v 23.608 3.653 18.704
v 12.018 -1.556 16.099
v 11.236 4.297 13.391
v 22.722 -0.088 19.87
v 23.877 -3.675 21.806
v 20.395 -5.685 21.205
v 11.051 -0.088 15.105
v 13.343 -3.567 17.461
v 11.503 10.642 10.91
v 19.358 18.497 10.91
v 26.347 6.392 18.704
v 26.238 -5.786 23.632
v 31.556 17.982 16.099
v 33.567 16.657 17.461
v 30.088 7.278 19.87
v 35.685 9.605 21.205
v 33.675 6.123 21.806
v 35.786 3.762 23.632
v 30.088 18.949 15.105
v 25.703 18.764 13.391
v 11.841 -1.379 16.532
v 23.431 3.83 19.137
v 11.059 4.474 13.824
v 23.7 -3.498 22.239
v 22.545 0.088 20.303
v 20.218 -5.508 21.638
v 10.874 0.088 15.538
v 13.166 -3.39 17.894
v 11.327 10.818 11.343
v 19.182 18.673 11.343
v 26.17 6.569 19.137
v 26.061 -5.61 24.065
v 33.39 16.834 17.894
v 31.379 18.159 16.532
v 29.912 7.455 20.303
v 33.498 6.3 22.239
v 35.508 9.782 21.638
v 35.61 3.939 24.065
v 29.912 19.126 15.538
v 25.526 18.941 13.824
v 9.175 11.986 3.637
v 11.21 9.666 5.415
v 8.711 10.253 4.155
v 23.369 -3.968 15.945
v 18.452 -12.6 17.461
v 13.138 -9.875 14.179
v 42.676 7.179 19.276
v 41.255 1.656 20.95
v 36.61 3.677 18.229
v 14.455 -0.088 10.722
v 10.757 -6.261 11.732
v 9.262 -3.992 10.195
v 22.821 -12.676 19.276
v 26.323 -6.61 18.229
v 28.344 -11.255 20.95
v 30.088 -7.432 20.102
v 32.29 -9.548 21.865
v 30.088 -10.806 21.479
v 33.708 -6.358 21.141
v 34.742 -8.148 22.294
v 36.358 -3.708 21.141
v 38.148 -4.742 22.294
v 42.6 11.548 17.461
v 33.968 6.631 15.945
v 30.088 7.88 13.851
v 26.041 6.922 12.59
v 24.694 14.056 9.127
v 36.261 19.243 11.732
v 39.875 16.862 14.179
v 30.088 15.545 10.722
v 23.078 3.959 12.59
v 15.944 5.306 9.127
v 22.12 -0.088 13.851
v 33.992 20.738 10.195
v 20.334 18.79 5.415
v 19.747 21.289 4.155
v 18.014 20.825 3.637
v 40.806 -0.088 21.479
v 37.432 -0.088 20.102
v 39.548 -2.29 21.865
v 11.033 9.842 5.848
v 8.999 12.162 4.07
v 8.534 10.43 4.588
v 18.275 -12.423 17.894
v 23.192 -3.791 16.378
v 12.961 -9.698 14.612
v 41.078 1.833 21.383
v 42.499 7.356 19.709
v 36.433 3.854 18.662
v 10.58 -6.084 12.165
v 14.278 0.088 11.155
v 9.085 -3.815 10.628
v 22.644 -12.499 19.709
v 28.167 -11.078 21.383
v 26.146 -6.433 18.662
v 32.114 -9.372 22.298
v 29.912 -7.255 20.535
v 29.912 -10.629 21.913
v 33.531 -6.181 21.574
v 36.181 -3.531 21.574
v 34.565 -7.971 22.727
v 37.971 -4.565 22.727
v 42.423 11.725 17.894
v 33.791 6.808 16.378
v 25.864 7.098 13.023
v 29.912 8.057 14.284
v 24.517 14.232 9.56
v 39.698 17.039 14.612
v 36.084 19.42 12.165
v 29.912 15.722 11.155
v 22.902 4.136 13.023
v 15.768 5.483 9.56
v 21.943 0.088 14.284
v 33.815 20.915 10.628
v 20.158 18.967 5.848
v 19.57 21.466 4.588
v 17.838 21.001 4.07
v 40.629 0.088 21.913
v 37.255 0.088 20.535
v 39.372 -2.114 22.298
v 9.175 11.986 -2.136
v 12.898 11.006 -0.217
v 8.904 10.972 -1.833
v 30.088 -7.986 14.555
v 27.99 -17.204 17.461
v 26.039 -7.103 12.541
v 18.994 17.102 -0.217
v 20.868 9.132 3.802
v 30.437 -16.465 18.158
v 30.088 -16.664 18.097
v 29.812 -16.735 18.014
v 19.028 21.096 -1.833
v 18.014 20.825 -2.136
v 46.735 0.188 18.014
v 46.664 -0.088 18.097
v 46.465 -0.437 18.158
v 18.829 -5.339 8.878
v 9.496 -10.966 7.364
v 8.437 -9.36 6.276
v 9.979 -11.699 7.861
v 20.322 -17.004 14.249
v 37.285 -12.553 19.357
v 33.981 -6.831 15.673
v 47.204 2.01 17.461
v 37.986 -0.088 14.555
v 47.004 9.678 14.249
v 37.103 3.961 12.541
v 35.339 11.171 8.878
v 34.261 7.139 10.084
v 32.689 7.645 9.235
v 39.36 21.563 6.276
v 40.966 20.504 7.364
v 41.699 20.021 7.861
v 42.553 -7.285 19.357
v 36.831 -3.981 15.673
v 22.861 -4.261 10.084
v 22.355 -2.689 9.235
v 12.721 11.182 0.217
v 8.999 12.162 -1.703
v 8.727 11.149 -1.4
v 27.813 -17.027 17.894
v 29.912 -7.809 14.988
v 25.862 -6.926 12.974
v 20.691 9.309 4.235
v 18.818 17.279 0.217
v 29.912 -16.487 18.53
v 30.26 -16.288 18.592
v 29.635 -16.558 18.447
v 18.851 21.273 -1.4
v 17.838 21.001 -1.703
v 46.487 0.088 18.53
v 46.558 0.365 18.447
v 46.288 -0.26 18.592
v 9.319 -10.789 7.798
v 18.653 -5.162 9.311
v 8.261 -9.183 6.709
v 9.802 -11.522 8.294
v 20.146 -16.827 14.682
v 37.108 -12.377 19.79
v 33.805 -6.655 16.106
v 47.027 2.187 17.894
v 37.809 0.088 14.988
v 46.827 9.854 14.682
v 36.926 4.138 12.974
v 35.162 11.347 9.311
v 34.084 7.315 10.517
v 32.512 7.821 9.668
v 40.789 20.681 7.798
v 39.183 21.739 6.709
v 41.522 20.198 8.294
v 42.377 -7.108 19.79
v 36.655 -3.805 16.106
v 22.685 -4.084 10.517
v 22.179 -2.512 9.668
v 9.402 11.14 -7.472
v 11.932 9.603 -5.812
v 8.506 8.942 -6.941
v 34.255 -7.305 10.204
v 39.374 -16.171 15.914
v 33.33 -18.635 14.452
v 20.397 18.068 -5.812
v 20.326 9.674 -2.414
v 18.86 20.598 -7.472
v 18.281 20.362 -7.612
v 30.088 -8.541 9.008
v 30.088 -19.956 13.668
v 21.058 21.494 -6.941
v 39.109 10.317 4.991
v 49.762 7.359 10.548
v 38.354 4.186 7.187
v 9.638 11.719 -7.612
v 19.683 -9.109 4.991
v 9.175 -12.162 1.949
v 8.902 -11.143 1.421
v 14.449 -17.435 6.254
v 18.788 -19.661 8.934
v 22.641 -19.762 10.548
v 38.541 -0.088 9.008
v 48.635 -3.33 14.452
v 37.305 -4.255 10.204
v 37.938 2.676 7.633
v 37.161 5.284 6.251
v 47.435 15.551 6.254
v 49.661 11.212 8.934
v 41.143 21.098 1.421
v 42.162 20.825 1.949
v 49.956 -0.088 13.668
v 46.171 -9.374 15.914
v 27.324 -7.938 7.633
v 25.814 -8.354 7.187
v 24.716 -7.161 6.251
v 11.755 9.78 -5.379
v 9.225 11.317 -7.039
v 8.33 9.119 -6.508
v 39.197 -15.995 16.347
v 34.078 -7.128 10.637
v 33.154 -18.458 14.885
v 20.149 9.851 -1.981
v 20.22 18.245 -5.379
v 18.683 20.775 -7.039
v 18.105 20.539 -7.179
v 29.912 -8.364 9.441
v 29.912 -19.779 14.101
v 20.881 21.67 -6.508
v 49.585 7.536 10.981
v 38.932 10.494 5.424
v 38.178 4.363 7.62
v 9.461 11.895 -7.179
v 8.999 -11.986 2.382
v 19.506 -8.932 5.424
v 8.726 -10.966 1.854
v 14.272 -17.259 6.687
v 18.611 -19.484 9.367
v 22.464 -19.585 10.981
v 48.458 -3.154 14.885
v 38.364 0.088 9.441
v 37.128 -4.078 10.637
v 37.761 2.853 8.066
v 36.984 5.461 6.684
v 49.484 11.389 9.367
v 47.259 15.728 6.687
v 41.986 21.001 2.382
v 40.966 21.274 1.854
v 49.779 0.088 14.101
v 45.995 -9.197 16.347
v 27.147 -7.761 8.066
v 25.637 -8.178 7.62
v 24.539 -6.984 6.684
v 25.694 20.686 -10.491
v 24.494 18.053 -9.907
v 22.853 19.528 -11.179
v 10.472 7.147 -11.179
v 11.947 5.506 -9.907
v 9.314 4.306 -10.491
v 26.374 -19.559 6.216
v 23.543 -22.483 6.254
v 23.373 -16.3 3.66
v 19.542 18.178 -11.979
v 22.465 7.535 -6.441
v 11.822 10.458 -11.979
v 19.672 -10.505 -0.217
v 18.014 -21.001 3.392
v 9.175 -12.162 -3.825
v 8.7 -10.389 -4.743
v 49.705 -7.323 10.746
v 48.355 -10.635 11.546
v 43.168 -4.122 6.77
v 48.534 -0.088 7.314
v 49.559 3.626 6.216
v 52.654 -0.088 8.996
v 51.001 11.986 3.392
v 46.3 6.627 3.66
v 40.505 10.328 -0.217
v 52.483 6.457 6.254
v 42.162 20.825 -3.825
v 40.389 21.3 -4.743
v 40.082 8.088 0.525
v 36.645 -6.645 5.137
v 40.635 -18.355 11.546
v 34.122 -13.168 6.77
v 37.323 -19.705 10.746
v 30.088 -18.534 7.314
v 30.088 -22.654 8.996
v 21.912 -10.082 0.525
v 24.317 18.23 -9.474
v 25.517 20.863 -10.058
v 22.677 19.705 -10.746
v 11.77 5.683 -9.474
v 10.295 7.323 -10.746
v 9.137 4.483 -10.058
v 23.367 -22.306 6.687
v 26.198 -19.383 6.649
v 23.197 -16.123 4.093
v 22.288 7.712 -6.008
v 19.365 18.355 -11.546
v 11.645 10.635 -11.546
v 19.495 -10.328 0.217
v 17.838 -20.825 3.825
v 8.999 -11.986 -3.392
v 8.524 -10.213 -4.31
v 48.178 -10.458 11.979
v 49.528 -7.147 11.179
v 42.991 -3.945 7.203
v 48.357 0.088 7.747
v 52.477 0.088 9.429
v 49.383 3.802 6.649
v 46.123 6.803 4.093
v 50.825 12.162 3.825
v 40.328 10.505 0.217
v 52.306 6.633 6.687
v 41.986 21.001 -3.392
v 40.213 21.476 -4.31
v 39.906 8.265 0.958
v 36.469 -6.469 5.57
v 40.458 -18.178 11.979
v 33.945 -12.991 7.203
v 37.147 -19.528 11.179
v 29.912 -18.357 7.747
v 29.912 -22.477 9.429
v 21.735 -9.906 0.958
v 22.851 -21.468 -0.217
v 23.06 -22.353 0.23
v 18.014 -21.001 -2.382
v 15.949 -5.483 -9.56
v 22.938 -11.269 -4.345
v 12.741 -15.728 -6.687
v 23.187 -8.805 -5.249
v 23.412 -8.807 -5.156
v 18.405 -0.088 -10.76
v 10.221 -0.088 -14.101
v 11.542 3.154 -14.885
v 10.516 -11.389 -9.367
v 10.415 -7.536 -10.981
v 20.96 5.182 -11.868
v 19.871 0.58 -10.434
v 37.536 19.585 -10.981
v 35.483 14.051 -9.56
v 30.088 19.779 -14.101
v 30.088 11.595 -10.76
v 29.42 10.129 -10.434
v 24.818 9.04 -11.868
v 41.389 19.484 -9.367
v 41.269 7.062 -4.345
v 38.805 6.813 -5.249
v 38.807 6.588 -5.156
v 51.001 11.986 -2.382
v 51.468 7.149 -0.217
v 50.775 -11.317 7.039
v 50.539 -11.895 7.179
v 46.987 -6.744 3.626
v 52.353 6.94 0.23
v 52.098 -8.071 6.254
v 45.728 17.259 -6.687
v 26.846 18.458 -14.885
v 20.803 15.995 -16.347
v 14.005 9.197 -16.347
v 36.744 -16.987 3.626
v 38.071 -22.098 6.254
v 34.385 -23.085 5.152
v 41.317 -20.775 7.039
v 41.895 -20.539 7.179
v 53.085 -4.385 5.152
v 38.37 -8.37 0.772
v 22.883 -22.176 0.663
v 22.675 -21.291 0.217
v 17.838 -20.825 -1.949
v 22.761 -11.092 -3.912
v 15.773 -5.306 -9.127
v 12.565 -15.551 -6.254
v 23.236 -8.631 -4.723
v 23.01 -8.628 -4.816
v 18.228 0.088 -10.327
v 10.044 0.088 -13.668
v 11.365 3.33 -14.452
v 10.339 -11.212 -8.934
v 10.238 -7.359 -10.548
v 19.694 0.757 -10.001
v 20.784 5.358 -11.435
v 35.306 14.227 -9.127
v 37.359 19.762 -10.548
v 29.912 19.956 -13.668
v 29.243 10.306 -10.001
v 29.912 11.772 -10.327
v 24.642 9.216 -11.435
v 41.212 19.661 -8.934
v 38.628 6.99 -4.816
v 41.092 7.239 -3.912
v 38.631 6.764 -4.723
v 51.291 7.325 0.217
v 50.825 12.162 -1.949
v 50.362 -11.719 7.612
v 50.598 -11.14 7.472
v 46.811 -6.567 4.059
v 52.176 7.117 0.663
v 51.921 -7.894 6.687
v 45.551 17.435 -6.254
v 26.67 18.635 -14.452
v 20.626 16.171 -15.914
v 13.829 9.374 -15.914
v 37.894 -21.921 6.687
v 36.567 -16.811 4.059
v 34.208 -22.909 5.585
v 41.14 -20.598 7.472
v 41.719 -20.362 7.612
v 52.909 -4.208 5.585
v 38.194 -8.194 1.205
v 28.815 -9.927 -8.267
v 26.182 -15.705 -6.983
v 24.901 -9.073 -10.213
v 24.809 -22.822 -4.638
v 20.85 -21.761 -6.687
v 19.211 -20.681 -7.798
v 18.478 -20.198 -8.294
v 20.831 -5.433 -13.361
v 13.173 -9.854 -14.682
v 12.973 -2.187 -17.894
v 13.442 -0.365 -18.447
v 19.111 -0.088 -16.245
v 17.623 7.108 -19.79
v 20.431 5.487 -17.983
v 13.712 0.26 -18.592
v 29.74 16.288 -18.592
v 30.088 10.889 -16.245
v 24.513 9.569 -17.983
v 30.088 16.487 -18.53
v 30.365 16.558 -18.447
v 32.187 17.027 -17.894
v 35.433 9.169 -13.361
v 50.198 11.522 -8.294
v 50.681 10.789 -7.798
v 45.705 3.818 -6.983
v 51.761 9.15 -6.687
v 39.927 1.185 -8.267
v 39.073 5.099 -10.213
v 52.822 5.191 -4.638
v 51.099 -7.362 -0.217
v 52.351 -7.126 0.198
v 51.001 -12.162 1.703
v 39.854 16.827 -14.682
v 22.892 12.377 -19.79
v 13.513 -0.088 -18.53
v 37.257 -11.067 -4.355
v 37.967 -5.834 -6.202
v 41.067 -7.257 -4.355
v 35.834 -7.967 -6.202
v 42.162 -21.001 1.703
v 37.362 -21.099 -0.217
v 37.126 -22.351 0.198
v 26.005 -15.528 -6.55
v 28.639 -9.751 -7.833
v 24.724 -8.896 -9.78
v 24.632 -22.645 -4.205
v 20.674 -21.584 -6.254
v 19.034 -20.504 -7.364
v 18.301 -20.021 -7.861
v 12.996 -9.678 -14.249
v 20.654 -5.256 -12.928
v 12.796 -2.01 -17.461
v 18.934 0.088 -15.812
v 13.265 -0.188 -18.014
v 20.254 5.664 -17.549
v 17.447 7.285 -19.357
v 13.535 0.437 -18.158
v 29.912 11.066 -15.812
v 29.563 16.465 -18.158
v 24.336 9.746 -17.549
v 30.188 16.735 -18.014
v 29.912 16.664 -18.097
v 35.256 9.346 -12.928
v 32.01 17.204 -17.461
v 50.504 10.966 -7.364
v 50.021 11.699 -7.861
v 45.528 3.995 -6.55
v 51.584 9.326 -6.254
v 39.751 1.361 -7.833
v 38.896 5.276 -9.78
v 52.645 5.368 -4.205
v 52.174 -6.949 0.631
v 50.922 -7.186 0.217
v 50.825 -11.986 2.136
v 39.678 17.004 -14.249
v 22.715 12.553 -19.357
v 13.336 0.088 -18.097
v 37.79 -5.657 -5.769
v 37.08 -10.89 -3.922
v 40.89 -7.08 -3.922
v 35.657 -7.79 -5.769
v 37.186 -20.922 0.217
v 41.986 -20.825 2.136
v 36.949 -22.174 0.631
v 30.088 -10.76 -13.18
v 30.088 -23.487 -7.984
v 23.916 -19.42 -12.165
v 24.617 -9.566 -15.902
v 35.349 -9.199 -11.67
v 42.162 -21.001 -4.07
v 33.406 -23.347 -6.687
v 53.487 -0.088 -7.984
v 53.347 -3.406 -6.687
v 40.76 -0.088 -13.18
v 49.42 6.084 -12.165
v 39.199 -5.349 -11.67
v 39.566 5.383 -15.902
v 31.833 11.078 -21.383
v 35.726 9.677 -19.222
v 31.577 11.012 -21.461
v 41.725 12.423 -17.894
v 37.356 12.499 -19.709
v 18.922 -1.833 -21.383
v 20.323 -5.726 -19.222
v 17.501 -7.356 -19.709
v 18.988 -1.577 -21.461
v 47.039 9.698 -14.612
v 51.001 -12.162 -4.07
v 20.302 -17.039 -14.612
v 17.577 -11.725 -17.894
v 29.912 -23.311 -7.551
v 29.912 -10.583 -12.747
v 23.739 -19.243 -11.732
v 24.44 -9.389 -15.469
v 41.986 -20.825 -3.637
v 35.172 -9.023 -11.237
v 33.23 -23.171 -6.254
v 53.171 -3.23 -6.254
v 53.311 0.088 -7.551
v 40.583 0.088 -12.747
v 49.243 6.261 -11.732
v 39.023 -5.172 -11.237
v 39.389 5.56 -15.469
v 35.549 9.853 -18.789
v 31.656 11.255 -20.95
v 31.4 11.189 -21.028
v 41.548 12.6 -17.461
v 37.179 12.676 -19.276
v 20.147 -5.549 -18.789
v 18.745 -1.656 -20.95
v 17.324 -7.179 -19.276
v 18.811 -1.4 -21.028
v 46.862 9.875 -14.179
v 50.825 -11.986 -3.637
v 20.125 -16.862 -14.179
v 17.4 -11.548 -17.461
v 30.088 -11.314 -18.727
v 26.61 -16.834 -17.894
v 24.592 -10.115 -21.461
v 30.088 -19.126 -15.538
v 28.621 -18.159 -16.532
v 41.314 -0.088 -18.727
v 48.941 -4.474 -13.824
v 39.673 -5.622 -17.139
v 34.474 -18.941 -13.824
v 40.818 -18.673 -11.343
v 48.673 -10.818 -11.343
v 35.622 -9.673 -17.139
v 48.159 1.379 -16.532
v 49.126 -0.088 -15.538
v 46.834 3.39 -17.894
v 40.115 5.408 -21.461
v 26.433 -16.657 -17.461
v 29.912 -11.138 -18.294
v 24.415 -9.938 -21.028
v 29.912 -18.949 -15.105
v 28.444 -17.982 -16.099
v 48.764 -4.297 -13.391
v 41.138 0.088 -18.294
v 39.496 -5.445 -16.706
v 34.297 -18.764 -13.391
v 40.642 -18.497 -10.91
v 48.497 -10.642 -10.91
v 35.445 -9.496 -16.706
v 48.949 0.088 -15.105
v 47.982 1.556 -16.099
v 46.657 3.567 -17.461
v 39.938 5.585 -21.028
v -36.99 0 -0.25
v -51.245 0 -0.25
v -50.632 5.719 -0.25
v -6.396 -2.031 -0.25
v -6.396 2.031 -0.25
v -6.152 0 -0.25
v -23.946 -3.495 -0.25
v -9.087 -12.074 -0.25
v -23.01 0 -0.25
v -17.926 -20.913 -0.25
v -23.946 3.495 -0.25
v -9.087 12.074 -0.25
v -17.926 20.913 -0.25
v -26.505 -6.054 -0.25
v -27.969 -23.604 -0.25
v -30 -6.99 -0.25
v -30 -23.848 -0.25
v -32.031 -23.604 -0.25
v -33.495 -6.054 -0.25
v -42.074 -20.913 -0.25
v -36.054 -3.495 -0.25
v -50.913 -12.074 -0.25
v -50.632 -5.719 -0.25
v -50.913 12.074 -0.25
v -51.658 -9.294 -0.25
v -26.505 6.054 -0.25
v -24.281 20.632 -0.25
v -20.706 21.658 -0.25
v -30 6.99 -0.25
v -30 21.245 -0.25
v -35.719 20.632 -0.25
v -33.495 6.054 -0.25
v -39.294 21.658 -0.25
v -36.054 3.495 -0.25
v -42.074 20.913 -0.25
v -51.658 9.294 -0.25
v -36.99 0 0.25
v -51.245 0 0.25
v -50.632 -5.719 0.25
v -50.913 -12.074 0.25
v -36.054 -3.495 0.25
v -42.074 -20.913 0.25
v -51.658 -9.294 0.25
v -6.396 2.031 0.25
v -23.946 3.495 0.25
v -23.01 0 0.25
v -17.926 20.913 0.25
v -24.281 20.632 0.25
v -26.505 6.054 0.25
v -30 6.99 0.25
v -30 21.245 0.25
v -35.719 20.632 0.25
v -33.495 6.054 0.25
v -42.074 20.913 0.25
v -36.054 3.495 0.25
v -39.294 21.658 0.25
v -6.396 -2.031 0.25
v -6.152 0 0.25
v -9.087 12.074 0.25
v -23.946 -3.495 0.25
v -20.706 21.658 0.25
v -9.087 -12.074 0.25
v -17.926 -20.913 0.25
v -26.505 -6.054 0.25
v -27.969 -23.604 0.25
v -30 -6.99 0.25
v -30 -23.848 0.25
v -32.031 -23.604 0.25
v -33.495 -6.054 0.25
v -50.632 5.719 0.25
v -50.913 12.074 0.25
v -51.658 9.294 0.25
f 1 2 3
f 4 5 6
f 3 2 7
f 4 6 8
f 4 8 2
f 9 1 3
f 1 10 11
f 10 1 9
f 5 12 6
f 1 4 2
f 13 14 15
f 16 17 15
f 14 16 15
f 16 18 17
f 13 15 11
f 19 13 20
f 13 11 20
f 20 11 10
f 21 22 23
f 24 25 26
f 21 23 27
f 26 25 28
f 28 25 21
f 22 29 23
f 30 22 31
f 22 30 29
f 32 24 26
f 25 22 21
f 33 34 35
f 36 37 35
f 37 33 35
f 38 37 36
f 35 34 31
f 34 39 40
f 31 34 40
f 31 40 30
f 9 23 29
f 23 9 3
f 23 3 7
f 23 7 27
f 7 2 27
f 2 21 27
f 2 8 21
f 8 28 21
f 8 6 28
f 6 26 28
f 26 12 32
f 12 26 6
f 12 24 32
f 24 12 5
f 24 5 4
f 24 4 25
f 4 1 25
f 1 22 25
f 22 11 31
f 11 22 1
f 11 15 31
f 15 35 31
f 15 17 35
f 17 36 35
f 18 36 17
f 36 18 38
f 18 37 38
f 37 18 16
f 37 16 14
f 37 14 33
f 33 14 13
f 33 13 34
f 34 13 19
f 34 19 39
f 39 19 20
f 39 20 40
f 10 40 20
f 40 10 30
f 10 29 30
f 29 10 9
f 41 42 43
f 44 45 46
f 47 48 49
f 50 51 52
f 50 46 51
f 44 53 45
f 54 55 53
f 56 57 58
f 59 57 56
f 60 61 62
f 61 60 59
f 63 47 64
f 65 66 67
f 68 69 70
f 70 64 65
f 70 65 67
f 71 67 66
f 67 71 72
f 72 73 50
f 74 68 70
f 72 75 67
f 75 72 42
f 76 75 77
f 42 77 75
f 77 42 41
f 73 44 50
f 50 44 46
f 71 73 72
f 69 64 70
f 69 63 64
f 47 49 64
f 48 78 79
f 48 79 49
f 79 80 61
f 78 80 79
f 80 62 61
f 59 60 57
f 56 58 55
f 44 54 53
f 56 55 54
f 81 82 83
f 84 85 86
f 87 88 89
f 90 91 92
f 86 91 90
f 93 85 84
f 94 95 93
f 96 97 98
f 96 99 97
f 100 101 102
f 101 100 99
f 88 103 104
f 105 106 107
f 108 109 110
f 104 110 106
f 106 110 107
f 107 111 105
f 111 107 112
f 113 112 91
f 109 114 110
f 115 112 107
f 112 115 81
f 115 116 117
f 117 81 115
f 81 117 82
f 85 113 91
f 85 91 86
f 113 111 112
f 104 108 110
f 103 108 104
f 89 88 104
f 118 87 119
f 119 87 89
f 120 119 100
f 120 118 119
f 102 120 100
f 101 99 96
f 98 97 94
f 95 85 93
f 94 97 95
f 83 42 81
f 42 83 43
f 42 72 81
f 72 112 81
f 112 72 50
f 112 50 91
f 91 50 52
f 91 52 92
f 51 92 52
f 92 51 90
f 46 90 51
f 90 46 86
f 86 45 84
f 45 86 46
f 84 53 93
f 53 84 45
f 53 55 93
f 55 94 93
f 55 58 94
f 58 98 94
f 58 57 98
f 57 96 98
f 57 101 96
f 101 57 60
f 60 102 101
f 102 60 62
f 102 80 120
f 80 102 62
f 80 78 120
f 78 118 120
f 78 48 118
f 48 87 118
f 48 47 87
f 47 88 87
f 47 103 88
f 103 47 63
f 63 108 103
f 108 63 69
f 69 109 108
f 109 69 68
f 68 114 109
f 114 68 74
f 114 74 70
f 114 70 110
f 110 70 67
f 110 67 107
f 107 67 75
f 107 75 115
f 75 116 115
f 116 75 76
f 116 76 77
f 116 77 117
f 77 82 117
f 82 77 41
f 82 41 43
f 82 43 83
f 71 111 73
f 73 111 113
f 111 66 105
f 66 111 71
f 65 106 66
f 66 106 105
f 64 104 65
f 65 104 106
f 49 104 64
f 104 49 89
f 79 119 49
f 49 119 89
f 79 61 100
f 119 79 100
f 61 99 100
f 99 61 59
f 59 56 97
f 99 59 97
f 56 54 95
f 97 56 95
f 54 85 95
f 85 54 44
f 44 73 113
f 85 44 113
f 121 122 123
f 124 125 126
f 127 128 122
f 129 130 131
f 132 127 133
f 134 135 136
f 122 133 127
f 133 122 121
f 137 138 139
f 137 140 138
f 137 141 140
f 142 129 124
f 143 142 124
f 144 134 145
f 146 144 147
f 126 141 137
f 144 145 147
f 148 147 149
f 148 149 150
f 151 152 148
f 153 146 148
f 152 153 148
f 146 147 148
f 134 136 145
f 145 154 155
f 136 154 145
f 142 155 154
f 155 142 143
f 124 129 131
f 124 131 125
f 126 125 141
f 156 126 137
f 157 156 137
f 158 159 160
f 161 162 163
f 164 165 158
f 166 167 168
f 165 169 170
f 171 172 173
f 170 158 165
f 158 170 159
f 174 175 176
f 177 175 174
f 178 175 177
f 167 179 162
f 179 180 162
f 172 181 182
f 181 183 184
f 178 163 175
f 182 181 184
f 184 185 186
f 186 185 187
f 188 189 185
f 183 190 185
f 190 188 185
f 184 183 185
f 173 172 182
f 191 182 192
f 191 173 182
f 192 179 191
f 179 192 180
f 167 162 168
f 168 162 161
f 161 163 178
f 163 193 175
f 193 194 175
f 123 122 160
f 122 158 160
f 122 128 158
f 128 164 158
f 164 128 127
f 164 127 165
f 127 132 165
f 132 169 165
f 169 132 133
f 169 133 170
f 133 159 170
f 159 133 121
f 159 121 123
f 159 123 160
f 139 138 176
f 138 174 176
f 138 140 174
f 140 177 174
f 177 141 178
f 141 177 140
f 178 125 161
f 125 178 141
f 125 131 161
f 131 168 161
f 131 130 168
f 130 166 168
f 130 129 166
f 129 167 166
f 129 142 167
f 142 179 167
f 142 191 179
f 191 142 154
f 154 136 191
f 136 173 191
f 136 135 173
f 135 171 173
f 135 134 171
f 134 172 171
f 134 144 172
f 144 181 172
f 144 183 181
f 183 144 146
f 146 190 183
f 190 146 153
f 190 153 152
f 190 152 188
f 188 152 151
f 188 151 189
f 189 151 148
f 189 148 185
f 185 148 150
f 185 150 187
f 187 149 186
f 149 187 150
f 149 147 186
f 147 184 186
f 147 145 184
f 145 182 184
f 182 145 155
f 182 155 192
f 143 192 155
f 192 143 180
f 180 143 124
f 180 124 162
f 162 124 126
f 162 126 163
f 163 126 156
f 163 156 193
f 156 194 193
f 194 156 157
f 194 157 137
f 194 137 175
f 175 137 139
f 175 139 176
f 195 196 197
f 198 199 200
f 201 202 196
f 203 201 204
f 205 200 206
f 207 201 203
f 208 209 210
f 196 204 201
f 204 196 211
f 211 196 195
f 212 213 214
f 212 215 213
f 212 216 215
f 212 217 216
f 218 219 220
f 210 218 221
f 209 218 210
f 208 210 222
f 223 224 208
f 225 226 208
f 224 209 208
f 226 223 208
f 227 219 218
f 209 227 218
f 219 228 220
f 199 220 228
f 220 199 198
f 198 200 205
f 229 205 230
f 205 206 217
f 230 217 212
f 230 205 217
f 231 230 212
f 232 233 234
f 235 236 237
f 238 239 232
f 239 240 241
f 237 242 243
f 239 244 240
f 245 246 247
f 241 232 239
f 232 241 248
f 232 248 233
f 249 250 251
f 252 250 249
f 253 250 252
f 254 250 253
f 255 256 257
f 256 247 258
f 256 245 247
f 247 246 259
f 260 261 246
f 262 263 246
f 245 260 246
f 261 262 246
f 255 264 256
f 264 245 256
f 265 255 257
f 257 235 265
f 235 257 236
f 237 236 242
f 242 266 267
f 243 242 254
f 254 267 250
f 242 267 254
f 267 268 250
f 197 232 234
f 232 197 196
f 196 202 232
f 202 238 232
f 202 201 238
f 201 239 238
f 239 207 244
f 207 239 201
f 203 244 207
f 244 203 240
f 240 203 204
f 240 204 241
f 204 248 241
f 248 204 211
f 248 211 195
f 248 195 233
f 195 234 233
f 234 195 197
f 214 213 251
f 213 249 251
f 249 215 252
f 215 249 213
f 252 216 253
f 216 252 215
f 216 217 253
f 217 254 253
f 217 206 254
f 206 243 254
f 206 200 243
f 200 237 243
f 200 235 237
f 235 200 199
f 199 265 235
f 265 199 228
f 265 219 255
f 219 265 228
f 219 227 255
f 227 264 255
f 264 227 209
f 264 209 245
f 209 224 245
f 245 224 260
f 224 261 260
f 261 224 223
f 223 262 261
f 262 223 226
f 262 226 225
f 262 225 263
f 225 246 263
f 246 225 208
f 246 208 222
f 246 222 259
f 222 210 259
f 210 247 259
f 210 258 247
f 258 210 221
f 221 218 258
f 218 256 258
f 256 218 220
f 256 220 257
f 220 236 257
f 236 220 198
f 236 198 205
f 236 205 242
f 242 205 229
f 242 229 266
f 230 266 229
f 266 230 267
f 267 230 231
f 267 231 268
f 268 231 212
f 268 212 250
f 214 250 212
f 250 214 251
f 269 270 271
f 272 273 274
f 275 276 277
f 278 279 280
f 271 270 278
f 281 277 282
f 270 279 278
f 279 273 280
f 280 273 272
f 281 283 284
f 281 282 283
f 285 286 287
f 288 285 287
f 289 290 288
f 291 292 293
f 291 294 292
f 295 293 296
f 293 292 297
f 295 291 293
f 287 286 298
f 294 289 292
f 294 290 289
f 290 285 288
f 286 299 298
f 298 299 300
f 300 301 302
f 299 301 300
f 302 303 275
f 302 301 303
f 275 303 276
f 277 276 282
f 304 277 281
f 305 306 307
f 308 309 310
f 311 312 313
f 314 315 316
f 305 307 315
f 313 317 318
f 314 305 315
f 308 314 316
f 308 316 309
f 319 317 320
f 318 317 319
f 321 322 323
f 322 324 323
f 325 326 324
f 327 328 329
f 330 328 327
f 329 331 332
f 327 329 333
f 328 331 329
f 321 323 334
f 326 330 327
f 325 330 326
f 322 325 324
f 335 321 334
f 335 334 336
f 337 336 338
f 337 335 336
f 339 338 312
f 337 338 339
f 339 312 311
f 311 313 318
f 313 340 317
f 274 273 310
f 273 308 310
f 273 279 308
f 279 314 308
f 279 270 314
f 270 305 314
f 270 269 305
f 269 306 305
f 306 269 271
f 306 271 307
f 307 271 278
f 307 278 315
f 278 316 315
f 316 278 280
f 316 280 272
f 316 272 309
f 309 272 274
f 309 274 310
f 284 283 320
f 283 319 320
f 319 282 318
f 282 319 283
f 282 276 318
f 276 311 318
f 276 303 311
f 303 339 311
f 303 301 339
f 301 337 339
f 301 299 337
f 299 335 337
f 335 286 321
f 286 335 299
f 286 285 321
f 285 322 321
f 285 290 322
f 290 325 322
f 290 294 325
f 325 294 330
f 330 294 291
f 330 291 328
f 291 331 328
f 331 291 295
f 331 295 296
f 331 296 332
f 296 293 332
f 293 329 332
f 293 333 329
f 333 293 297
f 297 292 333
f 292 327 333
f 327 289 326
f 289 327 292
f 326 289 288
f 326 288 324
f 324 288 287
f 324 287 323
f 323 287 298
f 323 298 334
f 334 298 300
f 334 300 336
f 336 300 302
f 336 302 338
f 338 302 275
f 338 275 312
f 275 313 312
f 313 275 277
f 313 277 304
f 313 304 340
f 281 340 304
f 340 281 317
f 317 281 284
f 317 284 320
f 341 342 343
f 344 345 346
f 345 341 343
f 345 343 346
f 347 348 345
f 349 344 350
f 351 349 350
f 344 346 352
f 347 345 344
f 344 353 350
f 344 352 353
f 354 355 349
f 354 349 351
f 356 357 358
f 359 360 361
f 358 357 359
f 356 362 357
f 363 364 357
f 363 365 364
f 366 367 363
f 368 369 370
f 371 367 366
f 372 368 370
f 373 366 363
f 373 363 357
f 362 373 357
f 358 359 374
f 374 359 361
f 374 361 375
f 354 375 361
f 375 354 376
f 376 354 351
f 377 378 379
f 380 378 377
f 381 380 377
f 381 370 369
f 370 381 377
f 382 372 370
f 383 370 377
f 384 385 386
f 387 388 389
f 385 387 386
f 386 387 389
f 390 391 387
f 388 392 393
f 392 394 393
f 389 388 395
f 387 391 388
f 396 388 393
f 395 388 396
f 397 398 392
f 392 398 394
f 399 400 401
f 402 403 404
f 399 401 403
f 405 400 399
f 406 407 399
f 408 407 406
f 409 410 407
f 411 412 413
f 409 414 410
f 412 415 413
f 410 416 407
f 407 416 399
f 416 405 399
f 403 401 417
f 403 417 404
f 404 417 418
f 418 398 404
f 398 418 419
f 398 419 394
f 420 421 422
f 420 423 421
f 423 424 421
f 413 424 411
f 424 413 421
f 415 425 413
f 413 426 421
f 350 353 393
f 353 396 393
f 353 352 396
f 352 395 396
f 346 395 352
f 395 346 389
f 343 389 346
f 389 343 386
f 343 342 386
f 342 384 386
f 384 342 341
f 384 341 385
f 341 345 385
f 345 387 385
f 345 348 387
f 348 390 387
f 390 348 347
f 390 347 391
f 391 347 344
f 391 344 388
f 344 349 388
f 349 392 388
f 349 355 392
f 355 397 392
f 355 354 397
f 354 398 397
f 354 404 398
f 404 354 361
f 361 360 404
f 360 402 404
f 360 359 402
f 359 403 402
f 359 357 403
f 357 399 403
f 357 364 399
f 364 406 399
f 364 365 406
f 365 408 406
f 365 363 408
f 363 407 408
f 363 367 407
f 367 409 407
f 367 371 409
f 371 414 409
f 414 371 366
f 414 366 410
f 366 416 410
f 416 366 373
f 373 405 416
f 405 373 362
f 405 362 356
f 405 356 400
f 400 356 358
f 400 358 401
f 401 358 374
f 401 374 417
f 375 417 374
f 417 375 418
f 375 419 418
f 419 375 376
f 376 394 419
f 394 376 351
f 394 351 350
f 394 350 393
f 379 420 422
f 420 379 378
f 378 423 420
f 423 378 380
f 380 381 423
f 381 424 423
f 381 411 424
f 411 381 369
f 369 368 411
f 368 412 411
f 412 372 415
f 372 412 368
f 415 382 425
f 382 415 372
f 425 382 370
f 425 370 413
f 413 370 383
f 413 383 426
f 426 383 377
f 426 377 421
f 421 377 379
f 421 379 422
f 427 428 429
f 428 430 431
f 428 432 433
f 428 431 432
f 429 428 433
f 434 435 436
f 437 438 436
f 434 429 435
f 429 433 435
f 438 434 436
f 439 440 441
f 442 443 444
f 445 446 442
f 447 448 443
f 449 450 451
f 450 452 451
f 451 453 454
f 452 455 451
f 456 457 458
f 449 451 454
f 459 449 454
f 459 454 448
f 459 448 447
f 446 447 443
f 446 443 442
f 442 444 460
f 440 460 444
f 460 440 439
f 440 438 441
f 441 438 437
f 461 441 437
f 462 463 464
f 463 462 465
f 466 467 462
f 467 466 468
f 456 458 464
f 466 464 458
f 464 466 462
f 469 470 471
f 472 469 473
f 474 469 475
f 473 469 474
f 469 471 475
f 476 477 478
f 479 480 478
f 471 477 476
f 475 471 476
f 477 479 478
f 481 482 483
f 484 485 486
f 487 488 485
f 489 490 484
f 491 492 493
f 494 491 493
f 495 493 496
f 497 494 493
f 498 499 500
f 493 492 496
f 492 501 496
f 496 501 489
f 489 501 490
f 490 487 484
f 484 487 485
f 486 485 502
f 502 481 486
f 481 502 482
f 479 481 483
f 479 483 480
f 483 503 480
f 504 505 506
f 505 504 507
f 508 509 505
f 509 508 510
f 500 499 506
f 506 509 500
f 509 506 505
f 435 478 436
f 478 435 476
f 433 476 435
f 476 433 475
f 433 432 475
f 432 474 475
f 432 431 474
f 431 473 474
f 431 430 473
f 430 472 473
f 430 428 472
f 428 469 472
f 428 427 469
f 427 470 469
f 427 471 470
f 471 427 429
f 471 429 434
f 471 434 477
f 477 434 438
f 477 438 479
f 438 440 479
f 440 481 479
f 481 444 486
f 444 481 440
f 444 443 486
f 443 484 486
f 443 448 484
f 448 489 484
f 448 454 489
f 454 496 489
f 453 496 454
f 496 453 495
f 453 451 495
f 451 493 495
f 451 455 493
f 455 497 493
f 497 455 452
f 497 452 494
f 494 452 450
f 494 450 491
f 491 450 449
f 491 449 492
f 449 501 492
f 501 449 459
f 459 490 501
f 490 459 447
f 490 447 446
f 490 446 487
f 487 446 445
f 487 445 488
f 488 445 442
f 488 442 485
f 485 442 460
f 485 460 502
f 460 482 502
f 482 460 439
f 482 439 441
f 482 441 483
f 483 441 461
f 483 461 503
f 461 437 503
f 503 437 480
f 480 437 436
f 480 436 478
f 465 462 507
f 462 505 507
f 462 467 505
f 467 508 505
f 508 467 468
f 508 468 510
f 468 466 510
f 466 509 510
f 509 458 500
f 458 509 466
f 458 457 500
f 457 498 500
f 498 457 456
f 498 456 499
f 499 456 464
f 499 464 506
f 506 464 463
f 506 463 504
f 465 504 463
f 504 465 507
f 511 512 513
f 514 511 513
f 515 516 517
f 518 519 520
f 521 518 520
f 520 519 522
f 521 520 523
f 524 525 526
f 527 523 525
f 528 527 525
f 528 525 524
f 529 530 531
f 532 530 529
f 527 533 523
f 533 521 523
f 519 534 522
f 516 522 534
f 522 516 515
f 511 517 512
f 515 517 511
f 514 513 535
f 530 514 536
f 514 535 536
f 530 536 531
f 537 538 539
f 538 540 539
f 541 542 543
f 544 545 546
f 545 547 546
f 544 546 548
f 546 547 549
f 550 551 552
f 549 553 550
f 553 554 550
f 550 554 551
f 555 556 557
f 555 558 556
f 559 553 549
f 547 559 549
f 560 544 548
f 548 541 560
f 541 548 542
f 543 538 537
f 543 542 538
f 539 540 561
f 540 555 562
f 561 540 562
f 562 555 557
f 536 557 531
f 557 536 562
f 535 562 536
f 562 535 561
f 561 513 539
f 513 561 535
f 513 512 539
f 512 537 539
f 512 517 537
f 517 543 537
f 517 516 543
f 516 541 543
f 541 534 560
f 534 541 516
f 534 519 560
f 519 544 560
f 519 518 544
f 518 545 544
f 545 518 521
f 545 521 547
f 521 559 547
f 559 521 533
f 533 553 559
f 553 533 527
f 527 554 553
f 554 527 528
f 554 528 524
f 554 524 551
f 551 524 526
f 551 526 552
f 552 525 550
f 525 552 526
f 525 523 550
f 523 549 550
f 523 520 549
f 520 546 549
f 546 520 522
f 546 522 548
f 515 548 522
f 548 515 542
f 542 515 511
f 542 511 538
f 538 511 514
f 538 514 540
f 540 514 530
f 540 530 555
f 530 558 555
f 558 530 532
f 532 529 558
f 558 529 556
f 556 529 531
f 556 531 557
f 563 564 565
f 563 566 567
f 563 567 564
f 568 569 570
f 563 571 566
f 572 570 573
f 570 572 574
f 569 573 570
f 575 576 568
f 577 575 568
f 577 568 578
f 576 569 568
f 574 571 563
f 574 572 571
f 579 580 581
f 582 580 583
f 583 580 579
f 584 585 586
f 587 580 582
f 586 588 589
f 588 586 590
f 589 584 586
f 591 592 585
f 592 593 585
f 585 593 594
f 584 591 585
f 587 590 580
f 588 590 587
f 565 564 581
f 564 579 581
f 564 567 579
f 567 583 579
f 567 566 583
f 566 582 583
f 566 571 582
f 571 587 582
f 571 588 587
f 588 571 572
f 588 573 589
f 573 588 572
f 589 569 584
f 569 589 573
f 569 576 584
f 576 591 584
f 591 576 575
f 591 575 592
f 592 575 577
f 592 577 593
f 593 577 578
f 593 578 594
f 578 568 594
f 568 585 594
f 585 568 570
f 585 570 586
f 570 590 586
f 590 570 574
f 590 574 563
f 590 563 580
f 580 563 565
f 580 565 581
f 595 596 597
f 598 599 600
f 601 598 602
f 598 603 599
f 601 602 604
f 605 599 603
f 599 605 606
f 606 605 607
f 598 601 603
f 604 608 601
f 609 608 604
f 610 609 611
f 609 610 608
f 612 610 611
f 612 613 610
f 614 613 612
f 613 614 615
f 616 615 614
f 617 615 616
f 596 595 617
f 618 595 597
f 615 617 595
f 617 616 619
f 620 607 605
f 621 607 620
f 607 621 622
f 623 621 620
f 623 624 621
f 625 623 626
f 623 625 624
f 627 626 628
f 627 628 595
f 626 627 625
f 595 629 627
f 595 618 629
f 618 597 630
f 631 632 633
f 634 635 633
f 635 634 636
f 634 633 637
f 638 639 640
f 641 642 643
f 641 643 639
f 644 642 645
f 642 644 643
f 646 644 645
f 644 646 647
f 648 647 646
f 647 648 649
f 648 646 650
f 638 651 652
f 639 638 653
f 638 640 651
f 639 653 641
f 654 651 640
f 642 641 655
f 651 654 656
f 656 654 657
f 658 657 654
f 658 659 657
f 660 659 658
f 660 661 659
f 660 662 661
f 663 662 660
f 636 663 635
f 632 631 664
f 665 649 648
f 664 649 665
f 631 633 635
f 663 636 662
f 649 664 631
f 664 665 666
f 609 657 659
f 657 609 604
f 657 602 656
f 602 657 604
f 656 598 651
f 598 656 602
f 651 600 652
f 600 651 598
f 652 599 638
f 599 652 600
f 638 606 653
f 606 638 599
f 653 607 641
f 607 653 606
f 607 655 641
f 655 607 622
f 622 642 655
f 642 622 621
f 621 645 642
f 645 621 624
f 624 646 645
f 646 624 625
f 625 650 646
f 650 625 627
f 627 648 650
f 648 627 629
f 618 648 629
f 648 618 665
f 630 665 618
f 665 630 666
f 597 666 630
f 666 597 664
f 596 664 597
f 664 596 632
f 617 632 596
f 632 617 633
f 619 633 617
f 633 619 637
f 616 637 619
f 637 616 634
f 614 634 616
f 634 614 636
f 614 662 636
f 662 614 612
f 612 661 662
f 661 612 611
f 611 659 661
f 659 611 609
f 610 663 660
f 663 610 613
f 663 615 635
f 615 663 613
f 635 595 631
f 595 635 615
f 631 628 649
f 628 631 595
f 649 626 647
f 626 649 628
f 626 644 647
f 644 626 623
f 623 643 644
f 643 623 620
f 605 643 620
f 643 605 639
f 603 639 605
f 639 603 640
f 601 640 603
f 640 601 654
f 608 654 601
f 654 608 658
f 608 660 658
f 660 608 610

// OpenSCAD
module thing()
{
	$fa = 30;
	difference() {
		sphere(r = 25);
		cylinder(h = 62.5, r1 = 12.5, r2 = 6.25, center = true);
		rotate(90, [ 1, 0, 0 ]) cylinder(h = 62.5,
				r1 = 12.5, r2 = 6.25, center = true);
		rotate(90, [ 0, 1, 0 ]) cylinder(h = 62.5,
				r1 = 12.5, r2 = 6.25, center = true);
	}
}

module demo_proj()
{
	linear_extrude(center = true, height = 0.5) projection(cut = false) thing();
	% thing();
}

module demo_cut()
{
	for (i=[-20:5:+20]) {
		 rotate(-30, [ 1, 1, 0 ]) translate([ 0, 0, -i ])
			linear_extrude(center = true, height = 0.5) projection(cut = true)
				translate([ 0, 0, i ]) rotate(+30, [ 1, 1, 0 ]) thing();
	}
	% thing();
}

translate([ -30, 0, 0 ]) demo_proj();
translate([ +30, 0, 0 ]) demo_cut();
